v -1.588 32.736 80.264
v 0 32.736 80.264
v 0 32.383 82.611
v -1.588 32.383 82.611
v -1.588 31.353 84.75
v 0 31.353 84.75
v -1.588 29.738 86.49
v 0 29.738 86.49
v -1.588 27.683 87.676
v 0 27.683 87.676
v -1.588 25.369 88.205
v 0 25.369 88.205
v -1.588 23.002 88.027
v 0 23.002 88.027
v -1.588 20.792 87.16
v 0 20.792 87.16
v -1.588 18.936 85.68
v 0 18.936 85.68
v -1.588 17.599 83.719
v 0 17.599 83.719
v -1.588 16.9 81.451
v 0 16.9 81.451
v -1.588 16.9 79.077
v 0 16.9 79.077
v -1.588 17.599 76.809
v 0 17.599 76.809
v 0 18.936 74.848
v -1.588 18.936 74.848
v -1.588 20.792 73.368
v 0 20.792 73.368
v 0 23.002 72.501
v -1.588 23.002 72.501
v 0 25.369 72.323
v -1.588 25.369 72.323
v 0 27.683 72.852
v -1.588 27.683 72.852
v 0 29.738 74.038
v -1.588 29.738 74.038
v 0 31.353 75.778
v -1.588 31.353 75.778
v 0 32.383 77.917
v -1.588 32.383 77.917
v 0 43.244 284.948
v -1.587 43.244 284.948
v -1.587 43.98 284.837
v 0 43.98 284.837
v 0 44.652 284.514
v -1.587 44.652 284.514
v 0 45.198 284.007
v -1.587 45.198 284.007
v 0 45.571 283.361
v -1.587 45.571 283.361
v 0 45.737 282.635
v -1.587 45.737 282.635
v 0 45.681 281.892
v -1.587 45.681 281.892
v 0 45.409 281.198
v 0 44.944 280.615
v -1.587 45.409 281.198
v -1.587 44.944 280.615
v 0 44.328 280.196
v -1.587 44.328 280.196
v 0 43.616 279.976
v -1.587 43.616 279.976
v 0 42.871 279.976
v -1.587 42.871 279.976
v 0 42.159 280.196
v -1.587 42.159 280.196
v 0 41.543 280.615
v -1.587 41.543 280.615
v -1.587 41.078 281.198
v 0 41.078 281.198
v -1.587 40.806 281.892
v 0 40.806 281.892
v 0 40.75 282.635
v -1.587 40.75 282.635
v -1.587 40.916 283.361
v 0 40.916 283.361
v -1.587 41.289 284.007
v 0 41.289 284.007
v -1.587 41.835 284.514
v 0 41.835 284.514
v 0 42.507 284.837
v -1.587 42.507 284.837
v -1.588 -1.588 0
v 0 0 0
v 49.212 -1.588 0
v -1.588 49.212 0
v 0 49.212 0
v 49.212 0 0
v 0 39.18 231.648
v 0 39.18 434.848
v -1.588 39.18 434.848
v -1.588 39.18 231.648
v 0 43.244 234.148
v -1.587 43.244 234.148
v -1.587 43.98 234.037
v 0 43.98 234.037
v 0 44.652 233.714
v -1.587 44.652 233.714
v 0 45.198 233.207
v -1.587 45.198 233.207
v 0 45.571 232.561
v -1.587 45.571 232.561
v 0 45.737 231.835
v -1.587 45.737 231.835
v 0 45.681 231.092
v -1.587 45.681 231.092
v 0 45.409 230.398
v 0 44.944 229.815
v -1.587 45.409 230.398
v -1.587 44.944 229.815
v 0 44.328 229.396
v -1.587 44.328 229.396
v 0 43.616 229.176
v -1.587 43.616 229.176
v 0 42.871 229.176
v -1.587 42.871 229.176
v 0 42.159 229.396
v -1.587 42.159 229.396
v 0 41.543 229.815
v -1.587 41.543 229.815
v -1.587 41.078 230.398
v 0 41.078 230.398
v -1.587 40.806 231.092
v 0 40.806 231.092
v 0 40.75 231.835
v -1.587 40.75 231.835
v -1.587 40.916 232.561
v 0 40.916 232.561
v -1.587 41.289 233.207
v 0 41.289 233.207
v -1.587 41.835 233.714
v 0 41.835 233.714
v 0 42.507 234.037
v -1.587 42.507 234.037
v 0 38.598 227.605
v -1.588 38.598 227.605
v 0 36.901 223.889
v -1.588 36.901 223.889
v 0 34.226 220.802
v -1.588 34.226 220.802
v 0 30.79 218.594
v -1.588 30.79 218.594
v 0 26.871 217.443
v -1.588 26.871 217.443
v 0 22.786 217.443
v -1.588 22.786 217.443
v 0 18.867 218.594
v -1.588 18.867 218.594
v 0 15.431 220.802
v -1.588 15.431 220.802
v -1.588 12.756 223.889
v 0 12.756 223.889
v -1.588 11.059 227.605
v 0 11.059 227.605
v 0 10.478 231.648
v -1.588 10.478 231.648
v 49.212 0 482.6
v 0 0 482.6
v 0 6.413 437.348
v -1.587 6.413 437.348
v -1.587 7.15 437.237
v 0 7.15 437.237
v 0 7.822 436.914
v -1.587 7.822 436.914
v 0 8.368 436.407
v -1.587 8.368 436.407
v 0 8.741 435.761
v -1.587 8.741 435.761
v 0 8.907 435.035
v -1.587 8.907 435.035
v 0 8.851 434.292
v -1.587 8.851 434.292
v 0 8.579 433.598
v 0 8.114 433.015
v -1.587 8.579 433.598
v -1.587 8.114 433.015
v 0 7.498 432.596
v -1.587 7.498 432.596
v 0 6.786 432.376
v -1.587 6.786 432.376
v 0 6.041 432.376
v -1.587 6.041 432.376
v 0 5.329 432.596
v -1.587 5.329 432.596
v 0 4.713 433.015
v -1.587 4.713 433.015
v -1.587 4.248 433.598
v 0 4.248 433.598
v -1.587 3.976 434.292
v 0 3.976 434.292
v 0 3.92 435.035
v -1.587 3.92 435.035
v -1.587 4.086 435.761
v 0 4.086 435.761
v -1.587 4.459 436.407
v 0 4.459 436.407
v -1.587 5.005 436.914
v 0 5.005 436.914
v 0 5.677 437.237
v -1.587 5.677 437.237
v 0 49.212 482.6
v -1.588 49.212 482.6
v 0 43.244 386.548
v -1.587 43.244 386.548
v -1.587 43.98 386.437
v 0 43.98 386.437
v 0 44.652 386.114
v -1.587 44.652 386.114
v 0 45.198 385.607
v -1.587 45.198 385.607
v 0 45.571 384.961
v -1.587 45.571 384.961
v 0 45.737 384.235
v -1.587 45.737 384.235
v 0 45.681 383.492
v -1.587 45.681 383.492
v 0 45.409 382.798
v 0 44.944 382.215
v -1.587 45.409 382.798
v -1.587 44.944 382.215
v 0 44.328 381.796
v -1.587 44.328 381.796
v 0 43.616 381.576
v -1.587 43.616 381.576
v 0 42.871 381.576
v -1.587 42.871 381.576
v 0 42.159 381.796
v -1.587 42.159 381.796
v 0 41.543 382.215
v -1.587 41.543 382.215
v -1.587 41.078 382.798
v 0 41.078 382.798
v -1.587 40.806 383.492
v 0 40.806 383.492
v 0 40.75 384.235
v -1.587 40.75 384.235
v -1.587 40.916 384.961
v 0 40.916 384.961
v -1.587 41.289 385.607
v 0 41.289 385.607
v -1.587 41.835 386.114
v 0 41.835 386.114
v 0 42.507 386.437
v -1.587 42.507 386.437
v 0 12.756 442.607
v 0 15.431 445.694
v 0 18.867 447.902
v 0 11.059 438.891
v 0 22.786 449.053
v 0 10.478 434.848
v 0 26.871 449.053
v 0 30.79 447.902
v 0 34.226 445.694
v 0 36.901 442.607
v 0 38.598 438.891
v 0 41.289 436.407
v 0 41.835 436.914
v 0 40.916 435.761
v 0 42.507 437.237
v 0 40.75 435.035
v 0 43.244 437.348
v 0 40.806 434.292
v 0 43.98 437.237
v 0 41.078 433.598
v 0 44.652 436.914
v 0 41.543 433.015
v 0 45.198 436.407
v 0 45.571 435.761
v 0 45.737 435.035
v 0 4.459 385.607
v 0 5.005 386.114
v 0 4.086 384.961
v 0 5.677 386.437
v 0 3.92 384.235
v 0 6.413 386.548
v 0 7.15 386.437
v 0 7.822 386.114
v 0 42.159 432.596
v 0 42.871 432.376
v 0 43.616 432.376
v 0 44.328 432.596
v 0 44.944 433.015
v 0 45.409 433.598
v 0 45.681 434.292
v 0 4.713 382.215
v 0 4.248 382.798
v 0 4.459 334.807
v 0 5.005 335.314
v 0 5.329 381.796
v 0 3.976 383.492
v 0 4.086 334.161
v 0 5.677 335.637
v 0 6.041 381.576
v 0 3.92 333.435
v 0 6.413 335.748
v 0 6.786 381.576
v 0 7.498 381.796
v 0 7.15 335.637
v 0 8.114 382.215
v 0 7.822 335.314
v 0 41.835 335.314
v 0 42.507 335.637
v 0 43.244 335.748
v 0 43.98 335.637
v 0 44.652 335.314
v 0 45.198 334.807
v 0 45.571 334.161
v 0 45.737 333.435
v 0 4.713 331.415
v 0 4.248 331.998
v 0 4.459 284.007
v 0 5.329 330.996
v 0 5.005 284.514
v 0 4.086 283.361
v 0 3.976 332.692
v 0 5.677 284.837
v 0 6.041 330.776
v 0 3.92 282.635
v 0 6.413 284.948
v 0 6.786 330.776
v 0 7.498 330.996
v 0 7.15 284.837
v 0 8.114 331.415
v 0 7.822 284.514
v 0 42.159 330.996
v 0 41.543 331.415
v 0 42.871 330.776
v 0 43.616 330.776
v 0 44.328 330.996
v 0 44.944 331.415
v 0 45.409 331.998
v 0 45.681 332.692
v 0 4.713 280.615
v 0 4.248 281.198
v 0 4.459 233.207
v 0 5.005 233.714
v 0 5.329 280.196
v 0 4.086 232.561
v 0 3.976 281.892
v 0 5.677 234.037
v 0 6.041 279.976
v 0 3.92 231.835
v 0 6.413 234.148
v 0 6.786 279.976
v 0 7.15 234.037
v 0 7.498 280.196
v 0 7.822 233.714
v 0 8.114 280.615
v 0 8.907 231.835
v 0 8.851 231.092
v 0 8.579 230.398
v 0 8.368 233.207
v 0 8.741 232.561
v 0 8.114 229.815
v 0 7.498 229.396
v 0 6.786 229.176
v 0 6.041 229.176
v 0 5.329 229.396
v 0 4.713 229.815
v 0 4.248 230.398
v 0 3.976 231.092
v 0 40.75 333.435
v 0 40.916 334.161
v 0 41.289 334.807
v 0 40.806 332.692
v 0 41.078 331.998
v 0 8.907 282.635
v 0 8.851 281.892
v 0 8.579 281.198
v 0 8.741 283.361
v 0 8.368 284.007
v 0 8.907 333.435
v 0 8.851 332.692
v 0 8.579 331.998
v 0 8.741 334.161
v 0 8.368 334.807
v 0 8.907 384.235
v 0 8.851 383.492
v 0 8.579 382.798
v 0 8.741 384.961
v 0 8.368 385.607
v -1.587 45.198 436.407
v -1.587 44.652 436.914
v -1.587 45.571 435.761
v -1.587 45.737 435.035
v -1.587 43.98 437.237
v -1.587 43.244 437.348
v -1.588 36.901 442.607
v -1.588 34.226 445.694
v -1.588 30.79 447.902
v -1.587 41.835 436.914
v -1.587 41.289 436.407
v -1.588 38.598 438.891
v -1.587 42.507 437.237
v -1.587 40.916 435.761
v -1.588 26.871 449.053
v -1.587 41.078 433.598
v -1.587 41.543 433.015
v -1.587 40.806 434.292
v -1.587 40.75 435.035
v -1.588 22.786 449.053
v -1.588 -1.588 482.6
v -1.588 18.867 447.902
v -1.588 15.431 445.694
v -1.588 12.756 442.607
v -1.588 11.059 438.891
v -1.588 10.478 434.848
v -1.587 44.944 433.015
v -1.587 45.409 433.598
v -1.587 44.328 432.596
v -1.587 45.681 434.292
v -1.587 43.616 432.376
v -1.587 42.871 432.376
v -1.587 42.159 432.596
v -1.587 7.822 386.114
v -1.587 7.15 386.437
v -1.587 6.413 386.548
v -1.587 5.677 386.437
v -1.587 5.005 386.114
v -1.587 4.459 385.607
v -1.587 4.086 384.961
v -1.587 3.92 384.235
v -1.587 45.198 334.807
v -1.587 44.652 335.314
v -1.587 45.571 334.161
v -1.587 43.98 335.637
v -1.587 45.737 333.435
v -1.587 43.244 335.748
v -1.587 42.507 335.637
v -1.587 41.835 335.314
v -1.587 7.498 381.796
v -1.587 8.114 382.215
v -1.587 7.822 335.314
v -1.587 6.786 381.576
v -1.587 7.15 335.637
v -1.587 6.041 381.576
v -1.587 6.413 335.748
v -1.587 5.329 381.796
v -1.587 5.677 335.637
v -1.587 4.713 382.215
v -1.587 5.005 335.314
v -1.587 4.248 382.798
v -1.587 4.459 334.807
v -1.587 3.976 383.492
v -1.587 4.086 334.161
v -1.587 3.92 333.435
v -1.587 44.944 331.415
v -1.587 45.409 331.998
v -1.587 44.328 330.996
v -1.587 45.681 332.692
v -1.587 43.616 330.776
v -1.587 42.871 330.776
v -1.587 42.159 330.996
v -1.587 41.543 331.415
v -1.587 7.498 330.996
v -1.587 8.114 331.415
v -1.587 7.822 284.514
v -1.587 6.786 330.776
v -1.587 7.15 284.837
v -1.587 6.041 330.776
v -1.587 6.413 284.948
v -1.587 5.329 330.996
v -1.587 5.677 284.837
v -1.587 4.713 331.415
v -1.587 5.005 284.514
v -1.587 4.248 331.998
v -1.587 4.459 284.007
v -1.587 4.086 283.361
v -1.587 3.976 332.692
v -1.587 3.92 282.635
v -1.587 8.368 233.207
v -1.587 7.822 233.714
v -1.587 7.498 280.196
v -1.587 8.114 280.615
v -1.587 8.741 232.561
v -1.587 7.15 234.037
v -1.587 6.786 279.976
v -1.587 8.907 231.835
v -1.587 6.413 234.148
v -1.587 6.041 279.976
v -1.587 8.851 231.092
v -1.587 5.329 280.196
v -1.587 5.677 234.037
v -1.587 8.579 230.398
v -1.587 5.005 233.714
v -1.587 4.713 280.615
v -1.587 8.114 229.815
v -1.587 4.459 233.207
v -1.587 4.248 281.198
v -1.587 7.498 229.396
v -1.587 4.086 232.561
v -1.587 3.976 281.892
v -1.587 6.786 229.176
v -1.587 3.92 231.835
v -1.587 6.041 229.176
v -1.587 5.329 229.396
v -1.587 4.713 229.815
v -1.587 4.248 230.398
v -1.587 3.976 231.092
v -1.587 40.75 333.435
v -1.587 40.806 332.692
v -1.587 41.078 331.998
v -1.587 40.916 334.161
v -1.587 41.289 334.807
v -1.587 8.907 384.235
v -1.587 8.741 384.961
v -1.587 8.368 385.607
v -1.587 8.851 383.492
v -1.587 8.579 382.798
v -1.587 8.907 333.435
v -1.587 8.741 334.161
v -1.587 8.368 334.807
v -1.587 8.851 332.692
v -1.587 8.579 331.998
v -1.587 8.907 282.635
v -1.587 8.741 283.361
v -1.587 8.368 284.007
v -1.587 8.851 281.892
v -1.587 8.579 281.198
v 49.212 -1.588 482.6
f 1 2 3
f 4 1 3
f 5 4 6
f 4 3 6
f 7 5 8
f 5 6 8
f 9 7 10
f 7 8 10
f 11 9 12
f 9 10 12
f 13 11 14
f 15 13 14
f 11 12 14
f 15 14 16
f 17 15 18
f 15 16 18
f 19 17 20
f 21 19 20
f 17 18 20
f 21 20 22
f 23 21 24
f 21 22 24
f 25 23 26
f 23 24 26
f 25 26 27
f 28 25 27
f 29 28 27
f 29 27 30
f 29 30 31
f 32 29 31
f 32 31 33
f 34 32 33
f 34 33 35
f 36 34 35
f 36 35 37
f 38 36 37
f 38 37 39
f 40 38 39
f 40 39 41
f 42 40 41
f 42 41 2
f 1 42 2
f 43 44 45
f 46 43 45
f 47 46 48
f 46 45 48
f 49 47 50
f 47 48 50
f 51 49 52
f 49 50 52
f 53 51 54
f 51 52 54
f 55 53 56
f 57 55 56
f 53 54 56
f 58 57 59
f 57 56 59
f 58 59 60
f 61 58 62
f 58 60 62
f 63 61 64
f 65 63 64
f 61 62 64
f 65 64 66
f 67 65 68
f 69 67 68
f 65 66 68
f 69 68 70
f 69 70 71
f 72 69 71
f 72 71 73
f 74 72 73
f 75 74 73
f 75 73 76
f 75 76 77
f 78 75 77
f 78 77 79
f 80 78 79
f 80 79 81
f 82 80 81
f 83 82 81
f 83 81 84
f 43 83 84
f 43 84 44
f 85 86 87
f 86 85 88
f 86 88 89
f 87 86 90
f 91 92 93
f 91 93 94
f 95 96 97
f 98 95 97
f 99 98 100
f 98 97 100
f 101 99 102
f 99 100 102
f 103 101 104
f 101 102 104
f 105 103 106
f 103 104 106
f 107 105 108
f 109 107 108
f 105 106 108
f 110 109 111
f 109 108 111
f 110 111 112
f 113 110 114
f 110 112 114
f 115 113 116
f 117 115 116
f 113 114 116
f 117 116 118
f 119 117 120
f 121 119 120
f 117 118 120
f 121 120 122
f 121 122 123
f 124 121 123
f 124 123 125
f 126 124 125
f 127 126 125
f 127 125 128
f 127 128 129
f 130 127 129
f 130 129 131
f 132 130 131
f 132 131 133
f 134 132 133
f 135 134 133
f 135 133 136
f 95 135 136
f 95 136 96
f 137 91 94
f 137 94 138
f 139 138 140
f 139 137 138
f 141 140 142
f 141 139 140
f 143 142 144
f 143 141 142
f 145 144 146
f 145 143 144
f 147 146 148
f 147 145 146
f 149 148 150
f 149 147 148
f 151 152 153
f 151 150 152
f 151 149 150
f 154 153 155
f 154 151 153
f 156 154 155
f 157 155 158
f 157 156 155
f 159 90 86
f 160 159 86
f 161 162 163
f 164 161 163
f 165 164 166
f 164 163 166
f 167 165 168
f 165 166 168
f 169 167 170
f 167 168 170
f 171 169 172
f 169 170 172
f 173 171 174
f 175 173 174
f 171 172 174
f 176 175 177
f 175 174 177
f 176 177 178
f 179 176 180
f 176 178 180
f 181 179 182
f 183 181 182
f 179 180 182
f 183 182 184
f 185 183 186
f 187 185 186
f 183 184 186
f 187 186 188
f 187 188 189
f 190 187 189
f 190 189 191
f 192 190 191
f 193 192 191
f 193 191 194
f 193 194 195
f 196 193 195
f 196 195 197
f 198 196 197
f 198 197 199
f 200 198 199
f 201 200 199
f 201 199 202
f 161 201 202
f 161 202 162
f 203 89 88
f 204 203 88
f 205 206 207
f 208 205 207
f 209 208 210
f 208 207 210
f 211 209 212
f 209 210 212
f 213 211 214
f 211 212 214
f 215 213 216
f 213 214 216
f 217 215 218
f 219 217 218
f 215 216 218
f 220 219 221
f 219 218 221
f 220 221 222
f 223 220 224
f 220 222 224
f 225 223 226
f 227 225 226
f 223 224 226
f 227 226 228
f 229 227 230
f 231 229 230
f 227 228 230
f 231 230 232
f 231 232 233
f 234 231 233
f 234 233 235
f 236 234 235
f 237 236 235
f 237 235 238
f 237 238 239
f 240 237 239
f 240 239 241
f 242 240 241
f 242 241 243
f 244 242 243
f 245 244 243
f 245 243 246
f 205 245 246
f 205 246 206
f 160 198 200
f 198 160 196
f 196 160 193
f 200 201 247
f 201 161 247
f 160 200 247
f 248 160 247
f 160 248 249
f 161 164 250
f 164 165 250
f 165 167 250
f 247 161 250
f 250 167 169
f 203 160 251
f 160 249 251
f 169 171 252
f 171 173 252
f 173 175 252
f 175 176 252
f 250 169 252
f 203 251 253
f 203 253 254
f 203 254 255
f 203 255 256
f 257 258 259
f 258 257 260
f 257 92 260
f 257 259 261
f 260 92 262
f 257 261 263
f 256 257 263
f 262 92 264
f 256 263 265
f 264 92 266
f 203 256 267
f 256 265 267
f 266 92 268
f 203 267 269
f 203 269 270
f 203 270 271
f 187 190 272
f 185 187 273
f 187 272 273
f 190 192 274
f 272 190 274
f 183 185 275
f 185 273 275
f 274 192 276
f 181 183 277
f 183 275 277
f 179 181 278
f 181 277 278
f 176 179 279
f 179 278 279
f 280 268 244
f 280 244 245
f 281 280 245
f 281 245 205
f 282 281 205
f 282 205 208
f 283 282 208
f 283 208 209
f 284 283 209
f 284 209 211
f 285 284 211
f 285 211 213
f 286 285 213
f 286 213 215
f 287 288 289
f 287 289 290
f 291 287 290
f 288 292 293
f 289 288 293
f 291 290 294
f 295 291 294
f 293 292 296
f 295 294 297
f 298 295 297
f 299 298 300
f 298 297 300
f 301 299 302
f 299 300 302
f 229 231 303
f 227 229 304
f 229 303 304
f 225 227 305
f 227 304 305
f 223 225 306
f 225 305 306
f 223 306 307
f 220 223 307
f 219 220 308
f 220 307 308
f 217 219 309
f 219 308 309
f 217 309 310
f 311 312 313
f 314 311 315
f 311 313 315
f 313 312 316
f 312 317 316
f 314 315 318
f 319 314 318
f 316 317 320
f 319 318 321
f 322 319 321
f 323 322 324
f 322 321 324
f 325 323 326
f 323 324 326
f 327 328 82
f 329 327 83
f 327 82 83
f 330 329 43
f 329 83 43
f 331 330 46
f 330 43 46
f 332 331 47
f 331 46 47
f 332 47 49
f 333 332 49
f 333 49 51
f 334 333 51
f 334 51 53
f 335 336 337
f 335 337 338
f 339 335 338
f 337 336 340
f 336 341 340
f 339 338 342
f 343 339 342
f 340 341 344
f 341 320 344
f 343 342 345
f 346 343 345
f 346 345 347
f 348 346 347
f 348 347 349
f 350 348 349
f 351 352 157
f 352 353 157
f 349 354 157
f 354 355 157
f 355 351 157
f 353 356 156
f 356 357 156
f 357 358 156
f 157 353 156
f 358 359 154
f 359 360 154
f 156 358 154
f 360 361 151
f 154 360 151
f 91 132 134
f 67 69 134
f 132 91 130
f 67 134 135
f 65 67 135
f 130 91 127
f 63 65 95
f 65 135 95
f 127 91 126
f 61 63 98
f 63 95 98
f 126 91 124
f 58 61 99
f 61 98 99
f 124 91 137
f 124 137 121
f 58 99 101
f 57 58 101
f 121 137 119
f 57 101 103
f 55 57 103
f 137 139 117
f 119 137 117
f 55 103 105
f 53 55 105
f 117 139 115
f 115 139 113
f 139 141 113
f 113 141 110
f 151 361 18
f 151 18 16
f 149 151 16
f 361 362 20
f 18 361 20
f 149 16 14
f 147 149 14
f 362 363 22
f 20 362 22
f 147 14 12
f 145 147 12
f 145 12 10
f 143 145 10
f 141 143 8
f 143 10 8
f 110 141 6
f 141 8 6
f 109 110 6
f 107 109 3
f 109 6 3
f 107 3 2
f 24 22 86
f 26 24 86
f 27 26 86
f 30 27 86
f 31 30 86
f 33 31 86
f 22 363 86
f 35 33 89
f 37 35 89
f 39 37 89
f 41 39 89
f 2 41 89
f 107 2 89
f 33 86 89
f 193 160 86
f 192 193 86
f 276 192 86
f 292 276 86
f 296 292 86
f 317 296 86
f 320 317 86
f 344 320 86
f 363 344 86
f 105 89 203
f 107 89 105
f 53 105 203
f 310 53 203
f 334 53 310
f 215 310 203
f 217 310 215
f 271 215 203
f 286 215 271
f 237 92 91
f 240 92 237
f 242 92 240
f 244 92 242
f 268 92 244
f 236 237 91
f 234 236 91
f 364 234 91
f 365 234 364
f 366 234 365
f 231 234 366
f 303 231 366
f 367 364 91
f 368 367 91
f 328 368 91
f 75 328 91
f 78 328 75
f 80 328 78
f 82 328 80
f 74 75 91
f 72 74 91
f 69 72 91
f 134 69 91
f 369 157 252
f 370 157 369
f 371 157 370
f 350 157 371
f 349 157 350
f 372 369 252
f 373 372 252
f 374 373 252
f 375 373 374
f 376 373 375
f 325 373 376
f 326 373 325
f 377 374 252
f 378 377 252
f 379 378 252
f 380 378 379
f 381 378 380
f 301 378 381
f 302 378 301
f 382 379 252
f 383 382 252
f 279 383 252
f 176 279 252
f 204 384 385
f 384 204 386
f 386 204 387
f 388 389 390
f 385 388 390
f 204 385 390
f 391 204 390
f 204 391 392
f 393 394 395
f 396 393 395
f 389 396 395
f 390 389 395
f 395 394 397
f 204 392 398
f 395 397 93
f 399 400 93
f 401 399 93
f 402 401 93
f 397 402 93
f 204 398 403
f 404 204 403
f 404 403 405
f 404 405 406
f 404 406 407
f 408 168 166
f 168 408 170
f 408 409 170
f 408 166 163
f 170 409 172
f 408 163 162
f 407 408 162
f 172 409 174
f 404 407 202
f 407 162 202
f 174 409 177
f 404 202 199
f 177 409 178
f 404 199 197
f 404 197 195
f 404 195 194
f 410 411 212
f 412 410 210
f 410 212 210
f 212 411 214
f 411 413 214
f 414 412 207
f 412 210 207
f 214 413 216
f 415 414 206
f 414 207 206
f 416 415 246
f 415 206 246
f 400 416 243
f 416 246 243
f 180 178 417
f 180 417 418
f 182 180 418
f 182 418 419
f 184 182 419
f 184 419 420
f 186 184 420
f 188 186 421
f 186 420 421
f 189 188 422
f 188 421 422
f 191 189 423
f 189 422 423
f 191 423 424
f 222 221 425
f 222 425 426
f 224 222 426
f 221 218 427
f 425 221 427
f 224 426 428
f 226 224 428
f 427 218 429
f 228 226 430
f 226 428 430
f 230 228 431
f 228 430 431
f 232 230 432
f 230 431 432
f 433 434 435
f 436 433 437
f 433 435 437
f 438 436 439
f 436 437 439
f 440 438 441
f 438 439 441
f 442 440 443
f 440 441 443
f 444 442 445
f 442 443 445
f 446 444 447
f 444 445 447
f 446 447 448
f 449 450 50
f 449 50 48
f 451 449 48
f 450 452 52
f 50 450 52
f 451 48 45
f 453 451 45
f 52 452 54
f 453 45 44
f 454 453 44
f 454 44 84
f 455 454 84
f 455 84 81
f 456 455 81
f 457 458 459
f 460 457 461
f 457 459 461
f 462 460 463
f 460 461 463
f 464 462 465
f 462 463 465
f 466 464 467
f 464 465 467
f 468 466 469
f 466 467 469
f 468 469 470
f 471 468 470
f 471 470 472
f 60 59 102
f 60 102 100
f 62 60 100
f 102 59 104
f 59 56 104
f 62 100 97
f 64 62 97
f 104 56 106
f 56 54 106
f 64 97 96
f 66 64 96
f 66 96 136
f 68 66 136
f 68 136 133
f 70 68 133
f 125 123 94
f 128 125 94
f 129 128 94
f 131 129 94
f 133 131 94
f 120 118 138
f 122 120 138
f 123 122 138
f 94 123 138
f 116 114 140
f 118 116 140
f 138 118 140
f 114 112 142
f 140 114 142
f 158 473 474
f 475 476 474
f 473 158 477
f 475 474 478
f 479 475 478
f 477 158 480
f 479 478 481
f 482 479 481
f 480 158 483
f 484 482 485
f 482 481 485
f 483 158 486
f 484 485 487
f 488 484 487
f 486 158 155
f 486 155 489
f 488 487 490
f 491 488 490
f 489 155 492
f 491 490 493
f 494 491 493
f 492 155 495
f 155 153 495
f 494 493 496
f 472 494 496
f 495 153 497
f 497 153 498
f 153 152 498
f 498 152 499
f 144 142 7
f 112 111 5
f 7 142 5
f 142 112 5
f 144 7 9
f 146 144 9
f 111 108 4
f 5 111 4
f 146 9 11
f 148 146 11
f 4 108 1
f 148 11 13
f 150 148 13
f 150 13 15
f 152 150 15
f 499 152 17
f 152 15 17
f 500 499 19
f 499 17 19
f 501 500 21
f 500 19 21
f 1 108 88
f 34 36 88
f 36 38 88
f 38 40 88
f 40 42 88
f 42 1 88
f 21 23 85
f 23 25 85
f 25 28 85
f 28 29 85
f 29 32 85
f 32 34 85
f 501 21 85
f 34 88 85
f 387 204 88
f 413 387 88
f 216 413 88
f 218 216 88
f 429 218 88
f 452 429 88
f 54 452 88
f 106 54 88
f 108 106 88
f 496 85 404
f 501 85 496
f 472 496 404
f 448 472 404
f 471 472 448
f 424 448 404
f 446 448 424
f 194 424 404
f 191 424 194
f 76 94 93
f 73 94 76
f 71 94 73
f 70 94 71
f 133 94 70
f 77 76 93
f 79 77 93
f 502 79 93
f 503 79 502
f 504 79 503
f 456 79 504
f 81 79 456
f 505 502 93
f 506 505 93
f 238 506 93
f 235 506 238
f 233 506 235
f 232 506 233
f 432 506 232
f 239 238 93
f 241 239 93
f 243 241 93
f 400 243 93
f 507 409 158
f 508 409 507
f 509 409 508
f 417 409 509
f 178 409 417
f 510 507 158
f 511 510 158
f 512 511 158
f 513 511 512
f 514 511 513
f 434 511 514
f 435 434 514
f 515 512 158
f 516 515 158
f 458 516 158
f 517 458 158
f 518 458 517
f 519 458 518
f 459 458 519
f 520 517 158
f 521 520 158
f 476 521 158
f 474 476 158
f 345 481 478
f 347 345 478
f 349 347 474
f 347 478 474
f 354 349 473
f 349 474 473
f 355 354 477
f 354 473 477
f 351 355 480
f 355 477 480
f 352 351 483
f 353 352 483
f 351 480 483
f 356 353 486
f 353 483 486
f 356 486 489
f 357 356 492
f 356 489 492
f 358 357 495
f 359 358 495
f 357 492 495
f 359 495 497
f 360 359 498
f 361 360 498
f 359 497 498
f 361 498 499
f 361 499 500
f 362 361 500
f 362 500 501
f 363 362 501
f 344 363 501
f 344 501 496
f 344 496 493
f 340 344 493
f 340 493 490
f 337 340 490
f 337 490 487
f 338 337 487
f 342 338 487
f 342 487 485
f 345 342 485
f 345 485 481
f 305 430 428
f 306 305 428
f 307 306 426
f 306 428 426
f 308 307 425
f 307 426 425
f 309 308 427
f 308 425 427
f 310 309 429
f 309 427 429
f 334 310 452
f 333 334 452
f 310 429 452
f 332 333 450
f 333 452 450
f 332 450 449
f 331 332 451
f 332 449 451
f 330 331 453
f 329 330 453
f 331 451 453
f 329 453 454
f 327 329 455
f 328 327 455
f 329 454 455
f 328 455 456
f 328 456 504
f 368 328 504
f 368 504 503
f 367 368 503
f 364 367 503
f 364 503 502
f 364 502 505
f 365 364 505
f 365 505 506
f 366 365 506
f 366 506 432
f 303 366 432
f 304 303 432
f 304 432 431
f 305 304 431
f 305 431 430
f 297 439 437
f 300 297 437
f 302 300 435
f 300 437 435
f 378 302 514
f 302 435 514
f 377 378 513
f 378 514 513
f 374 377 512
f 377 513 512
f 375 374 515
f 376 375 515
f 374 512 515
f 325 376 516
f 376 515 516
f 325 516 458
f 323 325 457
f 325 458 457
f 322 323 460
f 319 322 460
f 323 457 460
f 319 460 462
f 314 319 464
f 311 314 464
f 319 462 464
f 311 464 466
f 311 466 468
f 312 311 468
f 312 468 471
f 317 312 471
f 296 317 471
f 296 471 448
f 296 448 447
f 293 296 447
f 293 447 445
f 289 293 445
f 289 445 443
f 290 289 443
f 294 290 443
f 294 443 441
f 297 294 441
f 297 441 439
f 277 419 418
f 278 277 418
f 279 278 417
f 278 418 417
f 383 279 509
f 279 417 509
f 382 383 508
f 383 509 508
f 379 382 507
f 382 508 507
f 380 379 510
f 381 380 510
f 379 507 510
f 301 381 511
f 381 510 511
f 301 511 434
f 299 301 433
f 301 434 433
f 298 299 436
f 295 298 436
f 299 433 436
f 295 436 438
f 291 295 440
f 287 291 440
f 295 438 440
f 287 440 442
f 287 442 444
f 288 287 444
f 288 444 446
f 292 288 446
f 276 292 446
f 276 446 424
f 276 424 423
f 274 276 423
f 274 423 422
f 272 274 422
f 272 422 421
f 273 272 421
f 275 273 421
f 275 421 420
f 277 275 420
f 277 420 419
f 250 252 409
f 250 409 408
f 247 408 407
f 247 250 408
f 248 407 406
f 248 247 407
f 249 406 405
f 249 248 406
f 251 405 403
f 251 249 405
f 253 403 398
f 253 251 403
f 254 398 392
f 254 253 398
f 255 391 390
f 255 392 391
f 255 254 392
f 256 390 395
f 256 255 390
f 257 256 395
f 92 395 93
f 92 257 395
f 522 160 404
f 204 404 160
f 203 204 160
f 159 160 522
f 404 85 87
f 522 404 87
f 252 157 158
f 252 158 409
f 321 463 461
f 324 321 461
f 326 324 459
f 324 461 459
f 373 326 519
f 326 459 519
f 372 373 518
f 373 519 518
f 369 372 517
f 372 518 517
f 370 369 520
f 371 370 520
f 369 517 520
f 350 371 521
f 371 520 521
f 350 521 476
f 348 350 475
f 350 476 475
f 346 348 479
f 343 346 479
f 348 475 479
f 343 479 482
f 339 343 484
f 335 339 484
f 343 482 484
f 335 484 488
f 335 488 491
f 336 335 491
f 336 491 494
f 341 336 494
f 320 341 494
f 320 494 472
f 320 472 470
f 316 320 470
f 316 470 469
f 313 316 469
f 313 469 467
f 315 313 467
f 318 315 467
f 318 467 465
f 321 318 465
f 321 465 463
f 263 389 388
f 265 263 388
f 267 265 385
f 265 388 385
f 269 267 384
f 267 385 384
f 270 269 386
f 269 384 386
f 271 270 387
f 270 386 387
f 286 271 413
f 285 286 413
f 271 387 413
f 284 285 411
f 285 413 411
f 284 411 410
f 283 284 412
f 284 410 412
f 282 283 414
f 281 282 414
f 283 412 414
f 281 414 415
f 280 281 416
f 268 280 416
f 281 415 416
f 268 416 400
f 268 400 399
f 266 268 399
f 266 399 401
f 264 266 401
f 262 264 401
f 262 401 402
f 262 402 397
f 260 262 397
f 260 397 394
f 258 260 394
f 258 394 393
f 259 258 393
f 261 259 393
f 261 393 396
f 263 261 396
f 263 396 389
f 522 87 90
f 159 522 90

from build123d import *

# Parameters (mm, degrees)
BOSS_EXTRUDE2_DEPTH          = 482.6
CUT_EXTRUDE3_DEPTH           = 488.592555637
SKETCH7_R                    = 7.9629
CUT_EXTRUDE4_DEPTH           = 488.592555637
F_10_0_1935_DIAMETER_HOLE1_D = 4.999999906


with BuildPart() as part:
    # Sketch3 → Boss-Extrude2 (new body)
    with BuildSketch(Plane.XY):
        Polygon((0, 0), (0, 49.2125), (-1.5875, 49.2125), (-1.5875, -1.5875), (49.2125, -1.5875), (49.2125, 0), align=None)
    extrude(amount=BOSS_EXTRUDE2_DEPTH)

    # Sketch6 → Cut-Extrude3 (cut, through all)
    with BuildSketch(Plane(origin=(0, 0, 0), x_dir=(0, 0, -1), z_dir=(1, 0, 0))):
        with BuildLine():
            Line((-434.848, 39.1795), (-231.648, 39.1795))
            ThreePointArc((-231.648, 39.1795), (-217.297, 24.8285), (-231.648, 10.4775))
            Line((-231.648, 10.4775), (-434.848, 10.4775))
            ThreePointArc((-434.848, 10.4775), (-449.199, 24.8285), (-434.848, 39.1795))
        make_face()
    extrude(amount=-CUT_EXTRUDE3_DEPTH, mode=Mode.SUBTRACT)

    # Sketch7 → Cut-Extrude4 (cut, through all)
    with BuildSketch(Plane(origin=(0, 0, 0), x_dir=(0, 0, -1), z_dir=(1, 0, 0))):
        with Locations(Location((-80.264, 24.773594829, 0), (0, 0, 90))):
            Circle(SKETCH7_R)
    extrude(amount=-CUT_EXTRUDE4_DEPTH, mode=Mode.SUBTRACT)

    # #10 (0.1935) Diameter Hole1 (through all)
    with Locations(Plane(origin=(0, 0, 0), x_dir=(0, 0, -1), z_dir=(1, 0, 0))):
        with Locations((-434.848, 43.2435), (-384.048, 43.2435), (-333.248, 43.2435), (-282.448, 43.2435), (-231.648, 43.2435), (-231.648, 6.4135), (-282.448, 6.4135), (-333.248, 6.4135), (-384.048, 6.4135), (-434.848, 6.4135)):
            Hole(F_10_0_1935_DIAMETER_HOLE1_D / 2)


solid = part.part
